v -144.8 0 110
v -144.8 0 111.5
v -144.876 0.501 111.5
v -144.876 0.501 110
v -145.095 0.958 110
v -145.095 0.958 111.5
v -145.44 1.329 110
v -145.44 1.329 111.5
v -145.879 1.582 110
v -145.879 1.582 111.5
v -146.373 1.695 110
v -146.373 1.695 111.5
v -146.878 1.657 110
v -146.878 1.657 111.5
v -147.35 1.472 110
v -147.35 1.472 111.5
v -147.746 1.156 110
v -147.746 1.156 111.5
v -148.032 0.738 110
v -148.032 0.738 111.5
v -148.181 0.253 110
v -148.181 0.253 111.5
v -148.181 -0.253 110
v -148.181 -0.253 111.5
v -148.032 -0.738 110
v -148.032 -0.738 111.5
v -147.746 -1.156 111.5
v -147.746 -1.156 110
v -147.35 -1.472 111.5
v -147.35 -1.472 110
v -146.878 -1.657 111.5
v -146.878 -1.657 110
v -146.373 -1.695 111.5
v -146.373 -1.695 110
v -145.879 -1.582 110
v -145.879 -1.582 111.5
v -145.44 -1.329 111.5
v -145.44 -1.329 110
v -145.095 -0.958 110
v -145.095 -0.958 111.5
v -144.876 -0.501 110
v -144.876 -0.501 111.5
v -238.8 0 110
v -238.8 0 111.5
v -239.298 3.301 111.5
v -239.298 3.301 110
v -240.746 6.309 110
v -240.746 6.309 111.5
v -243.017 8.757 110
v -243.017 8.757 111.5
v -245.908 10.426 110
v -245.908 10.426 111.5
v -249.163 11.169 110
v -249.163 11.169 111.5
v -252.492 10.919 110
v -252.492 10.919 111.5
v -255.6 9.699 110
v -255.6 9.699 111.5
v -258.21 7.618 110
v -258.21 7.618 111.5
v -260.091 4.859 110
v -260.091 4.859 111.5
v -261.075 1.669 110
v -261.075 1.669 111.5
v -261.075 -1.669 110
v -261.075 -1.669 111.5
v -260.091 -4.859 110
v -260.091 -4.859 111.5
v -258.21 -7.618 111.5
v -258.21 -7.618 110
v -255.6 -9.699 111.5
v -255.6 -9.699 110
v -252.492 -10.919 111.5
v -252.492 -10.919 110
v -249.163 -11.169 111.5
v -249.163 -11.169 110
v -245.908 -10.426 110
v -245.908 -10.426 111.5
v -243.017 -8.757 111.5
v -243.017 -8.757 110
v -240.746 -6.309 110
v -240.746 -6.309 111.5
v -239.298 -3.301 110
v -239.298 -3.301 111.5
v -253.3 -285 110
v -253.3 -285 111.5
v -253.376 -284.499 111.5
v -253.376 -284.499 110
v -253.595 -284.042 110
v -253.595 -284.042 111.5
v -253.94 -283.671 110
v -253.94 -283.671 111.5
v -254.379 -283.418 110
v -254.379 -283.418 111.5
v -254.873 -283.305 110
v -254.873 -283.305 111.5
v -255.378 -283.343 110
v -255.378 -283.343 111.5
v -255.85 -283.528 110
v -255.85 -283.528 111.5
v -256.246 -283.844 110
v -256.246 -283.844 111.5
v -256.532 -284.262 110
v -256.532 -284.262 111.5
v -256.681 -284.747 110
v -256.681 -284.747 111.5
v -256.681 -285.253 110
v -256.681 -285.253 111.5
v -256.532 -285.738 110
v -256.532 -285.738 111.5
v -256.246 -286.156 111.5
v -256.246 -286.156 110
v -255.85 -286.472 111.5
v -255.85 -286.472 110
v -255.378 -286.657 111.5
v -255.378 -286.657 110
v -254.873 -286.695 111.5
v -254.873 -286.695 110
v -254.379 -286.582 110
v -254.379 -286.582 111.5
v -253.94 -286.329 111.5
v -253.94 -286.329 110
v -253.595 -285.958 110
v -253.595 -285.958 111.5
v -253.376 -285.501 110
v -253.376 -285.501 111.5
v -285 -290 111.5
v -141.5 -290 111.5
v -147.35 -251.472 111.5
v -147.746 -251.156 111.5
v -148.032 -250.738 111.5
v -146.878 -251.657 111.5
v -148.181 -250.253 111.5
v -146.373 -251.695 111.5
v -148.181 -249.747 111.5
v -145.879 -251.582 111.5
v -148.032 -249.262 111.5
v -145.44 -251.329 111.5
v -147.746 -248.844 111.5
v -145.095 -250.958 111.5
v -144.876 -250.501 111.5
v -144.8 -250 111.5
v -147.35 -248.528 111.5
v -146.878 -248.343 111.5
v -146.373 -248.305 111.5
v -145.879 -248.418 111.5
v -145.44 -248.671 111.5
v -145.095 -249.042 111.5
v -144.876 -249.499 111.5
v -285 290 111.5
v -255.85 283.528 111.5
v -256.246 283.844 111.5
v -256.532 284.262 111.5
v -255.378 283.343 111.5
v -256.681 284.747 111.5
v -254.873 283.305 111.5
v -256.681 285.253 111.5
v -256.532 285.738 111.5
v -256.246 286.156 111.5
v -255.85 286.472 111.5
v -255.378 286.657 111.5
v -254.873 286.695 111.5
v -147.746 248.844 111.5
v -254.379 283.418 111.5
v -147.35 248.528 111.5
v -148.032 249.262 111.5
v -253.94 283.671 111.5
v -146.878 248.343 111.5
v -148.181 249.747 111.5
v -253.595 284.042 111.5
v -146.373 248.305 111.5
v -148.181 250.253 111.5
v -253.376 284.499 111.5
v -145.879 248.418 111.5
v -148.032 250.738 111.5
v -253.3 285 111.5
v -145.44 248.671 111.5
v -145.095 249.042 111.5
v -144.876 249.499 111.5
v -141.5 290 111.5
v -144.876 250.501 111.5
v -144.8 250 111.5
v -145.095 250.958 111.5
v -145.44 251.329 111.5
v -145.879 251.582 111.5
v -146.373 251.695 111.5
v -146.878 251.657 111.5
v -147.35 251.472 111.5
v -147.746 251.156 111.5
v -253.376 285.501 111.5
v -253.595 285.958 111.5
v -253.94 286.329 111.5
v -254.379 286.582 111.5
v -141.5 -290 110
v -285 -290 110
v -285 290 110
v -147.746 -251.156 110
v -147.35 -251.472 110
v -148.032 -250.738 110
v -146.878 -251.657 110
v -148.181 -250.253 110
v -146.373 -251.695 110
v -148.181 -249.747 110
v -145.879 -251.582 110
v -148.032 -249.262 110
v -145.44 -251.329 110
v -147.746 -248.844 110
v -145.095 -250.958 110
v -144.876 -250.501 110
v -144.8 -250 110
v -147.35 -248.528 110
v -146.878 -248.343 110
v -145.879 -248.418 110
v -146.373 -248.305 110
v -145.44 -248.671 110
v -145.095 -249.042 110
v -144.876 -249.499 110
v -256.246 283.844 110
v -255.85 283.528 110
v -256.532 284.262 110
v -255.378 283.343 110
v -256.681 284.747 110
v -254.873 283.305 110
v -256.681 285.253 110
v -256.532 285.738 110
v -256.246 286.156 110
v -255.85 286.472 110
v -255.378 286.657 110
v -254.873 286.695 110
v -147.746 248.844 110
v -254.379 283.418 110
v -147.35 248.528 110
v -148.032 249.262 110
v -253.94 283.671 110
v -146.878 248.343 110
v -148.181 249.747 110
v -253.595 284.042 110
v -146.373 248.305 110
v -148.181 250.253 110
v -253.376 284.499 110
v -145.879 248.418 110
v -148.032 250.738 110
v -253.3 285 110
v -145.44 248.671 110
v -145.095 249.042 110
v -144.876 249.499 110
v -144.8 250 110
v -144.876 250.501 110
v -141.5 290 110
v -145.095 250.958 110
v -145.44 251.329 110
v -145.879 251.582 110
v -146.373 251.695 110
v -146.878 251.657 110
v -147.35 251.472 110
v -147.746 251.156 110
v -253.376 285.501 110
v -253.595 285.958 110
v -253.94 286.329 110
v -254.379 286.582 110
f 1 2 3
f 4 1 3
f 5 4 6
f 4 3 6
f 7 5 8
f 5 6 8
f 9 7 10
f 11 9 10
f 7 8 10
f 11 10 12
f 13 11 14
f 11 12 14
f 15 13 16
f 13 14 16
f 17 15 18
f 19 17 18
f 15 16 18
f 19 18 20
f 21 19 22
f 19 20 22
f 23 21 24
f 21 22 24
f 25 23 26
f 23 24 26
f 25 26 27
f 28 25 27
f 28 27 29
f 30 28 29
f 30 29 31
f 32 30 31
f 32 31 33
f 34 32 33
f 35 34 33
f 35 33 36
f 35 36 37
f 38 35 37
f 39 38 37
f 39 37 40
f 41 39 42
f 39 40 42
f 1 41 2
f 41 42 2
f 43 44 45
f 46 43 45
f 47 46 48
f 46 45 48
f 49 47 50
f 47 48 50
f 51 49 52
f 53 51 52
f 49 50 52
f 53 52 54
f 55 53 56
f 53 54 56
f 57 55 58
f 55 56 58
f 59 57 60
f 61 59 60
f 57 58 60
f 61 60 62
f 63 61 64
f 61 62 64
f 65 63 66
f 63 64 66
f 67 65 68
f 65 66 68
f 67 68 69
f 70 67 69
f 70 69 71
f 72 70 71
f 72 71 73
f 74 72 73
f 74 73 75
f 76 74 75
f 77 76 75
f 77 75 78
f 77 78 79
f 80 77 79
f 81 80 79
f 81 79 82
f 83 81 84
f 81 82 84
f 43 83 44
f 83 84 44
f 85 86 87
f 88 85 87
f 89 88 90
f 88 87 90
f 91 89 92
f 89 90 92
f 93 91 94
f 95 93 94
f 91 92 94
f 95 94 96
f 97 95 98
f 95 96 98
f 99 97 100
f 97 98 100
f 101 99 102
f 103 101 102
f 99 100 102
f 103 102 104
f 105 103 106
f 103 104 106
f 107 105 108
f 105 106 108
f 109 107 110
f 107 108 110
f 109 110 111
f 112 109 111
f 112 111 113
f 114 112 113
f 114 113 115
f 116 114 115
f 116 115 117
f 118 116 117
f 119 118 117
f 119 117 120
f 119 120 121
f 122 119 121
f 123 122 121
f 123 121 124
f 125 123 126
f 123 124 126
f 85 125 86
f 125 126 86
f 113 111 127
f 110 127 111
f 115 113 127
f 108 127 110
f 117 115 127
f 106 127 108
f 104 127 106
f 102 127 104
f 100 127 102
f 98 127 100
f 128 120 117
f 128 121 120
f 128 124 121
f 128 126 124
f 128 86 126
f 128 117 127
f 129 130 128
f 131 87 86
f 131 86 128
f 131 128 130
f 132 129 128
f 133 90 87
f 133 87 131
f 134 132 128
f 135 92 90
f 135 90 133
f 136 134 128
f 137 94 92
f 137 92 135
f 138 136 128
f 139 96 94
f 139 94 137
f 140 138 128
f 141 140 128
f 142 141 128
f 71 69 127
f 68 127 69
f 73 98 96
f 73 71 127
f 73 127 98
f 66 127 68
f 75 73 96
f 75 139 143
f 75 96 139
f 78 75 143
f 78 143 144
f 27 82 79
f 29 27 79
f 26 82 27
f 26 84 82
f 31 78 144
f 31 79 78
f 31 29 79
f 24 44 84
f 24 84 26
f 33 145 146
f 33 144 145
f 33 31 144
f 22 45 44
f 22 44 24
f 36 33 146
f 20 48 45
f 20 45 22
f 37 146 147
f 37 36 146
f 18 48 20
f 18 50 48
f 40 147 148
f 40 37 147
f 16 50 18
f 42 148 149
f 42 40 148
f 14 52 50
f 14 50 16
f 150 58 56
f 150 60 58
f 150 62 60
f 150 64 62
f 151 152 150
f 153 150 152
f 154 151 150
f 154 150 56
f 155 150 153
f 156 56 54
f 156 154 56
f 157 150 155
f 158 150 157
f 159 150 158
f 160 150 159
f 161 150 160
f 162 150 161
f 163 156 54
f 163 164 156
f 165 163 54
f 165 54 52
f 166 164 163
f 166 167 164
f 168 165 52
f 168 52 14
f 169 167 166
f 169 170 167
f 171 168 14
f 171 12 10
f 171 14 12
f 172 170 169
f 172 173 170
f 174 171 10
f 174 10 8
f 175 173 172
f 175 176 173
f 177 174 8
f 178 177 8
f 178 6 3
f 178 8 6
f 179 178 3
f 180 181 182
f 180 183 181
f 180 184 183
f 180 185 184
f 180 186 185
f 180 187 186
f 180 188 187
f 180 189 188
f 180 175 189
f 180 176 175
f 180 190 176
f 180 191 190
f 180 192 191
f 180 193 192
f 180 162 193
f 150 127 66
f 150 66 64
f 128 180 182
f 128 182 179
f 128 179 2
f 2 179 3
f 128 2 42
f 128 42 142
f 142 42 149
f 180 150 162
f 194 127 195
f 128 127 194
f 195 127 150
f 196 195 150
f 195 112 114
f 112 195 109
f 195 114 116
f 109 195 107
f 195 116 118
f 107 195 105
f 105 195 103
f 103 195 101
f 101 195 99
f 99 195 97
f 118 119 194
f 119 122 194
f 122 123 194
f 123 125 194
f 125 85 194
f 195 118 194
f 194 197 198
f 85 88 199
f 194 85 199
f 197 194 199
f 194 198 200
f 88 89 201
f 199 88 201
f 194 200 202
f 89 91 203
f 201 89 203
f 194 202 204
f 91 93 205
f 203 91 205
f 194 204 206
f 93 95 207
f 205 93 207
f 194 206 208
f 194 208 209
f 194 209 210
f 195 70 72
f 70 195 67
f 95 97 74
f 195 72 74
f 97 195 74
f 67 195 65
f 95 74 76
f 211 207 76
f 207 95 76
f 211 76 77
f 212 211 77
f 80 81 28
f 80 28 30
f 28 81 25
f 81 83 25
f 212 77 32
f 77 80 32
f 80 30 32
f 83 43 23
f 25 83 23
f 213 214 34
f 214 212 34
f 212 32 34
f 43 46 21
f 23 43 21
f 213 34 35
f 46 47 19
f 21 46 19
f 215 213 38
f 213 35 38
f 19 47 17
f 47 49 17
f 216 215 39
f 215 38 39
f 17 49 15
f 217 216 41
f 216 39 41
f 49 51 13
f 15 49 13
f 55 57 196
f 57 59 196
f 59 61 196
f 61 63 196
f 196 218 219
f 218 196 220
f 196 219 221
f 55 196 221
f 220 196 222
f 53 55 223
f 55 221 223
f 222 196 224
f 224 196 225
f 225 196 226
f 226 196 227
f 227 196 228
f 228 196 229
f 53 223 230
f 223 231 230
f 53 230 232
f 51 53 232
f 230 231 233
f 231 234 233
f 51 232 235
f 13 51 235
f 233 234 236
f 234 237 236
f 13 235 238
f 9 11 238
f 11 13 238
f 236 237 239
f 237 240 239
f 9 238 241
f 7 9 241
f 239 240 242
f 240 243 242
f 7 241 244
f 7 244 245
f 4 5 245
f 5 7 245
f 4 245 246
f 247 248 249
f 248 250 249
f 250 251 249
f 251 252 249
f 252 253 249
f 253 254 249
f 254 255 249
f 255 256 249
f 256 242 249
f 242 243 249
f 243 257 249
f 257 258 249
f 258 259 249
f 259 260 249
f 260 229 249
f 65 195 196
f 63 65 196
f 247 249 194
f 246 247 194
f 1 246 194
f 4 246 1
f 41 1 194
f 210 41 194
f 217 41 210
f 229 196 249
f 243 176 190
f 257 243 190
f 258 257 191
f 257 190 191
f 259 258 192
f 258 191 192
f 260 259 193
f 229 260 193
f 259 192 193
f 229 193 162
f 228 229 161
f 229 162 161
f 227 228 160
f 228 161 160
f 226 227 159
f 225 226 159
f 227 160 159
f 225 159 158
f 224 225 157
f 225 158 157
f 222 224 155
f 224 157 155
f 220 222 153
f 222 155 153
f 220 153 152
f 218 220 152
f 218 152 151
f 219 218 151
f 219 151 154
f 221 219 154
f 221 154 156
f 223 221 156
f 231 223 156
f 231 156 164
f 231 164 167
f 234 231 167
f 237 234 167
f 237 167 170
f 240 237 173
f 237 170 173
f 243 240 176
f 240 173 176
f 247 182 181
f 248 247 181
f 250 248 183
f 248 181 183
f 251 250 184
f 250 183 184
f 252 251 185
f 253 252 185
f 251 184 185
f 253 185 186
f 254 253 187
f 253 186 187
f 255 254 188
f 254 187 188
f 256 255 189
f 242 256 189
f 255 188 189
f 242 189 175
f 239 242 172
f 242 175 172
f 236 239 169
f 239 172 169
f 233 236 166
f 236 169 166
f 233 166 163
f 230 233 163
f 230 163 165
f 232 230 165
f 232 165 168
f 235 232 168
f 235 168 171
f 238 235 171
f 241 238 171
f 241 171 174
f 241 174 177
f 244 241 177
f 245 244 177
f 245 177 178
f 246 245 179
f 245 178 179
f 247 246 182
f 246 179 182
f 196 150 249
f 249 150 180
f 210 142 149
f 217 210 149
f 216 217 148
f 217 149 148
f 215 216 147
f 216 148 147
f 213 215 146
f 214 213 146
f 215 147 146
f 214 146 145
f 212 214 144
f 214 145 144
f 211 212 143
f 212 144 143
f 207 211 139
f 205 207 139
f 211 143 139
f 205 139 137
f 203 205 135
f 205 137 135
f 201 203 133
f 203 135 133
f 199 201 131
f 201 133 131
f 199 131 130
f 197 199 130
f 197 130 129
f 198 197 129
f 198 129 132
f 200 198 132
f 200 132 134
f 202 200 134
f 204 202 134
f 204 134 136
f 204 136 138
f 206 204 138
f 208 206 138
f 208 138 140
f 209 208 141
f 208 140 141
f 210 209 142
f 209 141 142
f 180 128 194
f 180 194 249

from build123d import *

# Parameters (mm, degrees)
MAIN_PROFILE_SKETCH_W   = 143.5
MAIN_PROFILE_SKETCH_H   = 580
MAIN_PROFILE_SKETCH_R   = 1.7
MAIN_PROFILE_SKETCH_R_2 = 11.2
MAIN_EXTRUSION_DEPTH    = 1.5


with BuildPart() as part:
    # Main Profile Sketch → Main Extrusion (new body)
    with BuildSketch(Plane.XY.offset(111.5)):
        with Locations((-213.25, 0)):
            Rectangle(MAIN_PROFILE_SKETCH_W, MAIN_PROFILE_SKETCH_H)
        with Locations((-255, -285)):
            Circle(MAIN_PROFILE_SKETCH_R, mode=Mode.SUBTRACT)
        with Locations((-146.5, -250)):
            Circle(MAIN_PROFILE_SKETCH_R, mode=Mode.SUBTRACT)
        with Locations((-250, 0)):
            Circle(MAIN_PROFILE_SKETCH_R_2, mode=Mode.SUBTRACT)
        with Locations((-255, 285)):
            Circle(MAIN_PROFILE_SKETCH_R, mode=Mode.SUBTRACT)
        with Locations((-146.5, 0)):
            Circle(MAIN_PROFILE_SKETCH_R, mode=Mode.SUBTRACT)
        with Locations((-146.5, 250)):
            Circle(MAIN_PROFILE_SKETCH_R, mode=Mode.SUBTRACT)
    extrude(amount=-MAIN_EXTRUSION_DEPTH)


solid = part.part
